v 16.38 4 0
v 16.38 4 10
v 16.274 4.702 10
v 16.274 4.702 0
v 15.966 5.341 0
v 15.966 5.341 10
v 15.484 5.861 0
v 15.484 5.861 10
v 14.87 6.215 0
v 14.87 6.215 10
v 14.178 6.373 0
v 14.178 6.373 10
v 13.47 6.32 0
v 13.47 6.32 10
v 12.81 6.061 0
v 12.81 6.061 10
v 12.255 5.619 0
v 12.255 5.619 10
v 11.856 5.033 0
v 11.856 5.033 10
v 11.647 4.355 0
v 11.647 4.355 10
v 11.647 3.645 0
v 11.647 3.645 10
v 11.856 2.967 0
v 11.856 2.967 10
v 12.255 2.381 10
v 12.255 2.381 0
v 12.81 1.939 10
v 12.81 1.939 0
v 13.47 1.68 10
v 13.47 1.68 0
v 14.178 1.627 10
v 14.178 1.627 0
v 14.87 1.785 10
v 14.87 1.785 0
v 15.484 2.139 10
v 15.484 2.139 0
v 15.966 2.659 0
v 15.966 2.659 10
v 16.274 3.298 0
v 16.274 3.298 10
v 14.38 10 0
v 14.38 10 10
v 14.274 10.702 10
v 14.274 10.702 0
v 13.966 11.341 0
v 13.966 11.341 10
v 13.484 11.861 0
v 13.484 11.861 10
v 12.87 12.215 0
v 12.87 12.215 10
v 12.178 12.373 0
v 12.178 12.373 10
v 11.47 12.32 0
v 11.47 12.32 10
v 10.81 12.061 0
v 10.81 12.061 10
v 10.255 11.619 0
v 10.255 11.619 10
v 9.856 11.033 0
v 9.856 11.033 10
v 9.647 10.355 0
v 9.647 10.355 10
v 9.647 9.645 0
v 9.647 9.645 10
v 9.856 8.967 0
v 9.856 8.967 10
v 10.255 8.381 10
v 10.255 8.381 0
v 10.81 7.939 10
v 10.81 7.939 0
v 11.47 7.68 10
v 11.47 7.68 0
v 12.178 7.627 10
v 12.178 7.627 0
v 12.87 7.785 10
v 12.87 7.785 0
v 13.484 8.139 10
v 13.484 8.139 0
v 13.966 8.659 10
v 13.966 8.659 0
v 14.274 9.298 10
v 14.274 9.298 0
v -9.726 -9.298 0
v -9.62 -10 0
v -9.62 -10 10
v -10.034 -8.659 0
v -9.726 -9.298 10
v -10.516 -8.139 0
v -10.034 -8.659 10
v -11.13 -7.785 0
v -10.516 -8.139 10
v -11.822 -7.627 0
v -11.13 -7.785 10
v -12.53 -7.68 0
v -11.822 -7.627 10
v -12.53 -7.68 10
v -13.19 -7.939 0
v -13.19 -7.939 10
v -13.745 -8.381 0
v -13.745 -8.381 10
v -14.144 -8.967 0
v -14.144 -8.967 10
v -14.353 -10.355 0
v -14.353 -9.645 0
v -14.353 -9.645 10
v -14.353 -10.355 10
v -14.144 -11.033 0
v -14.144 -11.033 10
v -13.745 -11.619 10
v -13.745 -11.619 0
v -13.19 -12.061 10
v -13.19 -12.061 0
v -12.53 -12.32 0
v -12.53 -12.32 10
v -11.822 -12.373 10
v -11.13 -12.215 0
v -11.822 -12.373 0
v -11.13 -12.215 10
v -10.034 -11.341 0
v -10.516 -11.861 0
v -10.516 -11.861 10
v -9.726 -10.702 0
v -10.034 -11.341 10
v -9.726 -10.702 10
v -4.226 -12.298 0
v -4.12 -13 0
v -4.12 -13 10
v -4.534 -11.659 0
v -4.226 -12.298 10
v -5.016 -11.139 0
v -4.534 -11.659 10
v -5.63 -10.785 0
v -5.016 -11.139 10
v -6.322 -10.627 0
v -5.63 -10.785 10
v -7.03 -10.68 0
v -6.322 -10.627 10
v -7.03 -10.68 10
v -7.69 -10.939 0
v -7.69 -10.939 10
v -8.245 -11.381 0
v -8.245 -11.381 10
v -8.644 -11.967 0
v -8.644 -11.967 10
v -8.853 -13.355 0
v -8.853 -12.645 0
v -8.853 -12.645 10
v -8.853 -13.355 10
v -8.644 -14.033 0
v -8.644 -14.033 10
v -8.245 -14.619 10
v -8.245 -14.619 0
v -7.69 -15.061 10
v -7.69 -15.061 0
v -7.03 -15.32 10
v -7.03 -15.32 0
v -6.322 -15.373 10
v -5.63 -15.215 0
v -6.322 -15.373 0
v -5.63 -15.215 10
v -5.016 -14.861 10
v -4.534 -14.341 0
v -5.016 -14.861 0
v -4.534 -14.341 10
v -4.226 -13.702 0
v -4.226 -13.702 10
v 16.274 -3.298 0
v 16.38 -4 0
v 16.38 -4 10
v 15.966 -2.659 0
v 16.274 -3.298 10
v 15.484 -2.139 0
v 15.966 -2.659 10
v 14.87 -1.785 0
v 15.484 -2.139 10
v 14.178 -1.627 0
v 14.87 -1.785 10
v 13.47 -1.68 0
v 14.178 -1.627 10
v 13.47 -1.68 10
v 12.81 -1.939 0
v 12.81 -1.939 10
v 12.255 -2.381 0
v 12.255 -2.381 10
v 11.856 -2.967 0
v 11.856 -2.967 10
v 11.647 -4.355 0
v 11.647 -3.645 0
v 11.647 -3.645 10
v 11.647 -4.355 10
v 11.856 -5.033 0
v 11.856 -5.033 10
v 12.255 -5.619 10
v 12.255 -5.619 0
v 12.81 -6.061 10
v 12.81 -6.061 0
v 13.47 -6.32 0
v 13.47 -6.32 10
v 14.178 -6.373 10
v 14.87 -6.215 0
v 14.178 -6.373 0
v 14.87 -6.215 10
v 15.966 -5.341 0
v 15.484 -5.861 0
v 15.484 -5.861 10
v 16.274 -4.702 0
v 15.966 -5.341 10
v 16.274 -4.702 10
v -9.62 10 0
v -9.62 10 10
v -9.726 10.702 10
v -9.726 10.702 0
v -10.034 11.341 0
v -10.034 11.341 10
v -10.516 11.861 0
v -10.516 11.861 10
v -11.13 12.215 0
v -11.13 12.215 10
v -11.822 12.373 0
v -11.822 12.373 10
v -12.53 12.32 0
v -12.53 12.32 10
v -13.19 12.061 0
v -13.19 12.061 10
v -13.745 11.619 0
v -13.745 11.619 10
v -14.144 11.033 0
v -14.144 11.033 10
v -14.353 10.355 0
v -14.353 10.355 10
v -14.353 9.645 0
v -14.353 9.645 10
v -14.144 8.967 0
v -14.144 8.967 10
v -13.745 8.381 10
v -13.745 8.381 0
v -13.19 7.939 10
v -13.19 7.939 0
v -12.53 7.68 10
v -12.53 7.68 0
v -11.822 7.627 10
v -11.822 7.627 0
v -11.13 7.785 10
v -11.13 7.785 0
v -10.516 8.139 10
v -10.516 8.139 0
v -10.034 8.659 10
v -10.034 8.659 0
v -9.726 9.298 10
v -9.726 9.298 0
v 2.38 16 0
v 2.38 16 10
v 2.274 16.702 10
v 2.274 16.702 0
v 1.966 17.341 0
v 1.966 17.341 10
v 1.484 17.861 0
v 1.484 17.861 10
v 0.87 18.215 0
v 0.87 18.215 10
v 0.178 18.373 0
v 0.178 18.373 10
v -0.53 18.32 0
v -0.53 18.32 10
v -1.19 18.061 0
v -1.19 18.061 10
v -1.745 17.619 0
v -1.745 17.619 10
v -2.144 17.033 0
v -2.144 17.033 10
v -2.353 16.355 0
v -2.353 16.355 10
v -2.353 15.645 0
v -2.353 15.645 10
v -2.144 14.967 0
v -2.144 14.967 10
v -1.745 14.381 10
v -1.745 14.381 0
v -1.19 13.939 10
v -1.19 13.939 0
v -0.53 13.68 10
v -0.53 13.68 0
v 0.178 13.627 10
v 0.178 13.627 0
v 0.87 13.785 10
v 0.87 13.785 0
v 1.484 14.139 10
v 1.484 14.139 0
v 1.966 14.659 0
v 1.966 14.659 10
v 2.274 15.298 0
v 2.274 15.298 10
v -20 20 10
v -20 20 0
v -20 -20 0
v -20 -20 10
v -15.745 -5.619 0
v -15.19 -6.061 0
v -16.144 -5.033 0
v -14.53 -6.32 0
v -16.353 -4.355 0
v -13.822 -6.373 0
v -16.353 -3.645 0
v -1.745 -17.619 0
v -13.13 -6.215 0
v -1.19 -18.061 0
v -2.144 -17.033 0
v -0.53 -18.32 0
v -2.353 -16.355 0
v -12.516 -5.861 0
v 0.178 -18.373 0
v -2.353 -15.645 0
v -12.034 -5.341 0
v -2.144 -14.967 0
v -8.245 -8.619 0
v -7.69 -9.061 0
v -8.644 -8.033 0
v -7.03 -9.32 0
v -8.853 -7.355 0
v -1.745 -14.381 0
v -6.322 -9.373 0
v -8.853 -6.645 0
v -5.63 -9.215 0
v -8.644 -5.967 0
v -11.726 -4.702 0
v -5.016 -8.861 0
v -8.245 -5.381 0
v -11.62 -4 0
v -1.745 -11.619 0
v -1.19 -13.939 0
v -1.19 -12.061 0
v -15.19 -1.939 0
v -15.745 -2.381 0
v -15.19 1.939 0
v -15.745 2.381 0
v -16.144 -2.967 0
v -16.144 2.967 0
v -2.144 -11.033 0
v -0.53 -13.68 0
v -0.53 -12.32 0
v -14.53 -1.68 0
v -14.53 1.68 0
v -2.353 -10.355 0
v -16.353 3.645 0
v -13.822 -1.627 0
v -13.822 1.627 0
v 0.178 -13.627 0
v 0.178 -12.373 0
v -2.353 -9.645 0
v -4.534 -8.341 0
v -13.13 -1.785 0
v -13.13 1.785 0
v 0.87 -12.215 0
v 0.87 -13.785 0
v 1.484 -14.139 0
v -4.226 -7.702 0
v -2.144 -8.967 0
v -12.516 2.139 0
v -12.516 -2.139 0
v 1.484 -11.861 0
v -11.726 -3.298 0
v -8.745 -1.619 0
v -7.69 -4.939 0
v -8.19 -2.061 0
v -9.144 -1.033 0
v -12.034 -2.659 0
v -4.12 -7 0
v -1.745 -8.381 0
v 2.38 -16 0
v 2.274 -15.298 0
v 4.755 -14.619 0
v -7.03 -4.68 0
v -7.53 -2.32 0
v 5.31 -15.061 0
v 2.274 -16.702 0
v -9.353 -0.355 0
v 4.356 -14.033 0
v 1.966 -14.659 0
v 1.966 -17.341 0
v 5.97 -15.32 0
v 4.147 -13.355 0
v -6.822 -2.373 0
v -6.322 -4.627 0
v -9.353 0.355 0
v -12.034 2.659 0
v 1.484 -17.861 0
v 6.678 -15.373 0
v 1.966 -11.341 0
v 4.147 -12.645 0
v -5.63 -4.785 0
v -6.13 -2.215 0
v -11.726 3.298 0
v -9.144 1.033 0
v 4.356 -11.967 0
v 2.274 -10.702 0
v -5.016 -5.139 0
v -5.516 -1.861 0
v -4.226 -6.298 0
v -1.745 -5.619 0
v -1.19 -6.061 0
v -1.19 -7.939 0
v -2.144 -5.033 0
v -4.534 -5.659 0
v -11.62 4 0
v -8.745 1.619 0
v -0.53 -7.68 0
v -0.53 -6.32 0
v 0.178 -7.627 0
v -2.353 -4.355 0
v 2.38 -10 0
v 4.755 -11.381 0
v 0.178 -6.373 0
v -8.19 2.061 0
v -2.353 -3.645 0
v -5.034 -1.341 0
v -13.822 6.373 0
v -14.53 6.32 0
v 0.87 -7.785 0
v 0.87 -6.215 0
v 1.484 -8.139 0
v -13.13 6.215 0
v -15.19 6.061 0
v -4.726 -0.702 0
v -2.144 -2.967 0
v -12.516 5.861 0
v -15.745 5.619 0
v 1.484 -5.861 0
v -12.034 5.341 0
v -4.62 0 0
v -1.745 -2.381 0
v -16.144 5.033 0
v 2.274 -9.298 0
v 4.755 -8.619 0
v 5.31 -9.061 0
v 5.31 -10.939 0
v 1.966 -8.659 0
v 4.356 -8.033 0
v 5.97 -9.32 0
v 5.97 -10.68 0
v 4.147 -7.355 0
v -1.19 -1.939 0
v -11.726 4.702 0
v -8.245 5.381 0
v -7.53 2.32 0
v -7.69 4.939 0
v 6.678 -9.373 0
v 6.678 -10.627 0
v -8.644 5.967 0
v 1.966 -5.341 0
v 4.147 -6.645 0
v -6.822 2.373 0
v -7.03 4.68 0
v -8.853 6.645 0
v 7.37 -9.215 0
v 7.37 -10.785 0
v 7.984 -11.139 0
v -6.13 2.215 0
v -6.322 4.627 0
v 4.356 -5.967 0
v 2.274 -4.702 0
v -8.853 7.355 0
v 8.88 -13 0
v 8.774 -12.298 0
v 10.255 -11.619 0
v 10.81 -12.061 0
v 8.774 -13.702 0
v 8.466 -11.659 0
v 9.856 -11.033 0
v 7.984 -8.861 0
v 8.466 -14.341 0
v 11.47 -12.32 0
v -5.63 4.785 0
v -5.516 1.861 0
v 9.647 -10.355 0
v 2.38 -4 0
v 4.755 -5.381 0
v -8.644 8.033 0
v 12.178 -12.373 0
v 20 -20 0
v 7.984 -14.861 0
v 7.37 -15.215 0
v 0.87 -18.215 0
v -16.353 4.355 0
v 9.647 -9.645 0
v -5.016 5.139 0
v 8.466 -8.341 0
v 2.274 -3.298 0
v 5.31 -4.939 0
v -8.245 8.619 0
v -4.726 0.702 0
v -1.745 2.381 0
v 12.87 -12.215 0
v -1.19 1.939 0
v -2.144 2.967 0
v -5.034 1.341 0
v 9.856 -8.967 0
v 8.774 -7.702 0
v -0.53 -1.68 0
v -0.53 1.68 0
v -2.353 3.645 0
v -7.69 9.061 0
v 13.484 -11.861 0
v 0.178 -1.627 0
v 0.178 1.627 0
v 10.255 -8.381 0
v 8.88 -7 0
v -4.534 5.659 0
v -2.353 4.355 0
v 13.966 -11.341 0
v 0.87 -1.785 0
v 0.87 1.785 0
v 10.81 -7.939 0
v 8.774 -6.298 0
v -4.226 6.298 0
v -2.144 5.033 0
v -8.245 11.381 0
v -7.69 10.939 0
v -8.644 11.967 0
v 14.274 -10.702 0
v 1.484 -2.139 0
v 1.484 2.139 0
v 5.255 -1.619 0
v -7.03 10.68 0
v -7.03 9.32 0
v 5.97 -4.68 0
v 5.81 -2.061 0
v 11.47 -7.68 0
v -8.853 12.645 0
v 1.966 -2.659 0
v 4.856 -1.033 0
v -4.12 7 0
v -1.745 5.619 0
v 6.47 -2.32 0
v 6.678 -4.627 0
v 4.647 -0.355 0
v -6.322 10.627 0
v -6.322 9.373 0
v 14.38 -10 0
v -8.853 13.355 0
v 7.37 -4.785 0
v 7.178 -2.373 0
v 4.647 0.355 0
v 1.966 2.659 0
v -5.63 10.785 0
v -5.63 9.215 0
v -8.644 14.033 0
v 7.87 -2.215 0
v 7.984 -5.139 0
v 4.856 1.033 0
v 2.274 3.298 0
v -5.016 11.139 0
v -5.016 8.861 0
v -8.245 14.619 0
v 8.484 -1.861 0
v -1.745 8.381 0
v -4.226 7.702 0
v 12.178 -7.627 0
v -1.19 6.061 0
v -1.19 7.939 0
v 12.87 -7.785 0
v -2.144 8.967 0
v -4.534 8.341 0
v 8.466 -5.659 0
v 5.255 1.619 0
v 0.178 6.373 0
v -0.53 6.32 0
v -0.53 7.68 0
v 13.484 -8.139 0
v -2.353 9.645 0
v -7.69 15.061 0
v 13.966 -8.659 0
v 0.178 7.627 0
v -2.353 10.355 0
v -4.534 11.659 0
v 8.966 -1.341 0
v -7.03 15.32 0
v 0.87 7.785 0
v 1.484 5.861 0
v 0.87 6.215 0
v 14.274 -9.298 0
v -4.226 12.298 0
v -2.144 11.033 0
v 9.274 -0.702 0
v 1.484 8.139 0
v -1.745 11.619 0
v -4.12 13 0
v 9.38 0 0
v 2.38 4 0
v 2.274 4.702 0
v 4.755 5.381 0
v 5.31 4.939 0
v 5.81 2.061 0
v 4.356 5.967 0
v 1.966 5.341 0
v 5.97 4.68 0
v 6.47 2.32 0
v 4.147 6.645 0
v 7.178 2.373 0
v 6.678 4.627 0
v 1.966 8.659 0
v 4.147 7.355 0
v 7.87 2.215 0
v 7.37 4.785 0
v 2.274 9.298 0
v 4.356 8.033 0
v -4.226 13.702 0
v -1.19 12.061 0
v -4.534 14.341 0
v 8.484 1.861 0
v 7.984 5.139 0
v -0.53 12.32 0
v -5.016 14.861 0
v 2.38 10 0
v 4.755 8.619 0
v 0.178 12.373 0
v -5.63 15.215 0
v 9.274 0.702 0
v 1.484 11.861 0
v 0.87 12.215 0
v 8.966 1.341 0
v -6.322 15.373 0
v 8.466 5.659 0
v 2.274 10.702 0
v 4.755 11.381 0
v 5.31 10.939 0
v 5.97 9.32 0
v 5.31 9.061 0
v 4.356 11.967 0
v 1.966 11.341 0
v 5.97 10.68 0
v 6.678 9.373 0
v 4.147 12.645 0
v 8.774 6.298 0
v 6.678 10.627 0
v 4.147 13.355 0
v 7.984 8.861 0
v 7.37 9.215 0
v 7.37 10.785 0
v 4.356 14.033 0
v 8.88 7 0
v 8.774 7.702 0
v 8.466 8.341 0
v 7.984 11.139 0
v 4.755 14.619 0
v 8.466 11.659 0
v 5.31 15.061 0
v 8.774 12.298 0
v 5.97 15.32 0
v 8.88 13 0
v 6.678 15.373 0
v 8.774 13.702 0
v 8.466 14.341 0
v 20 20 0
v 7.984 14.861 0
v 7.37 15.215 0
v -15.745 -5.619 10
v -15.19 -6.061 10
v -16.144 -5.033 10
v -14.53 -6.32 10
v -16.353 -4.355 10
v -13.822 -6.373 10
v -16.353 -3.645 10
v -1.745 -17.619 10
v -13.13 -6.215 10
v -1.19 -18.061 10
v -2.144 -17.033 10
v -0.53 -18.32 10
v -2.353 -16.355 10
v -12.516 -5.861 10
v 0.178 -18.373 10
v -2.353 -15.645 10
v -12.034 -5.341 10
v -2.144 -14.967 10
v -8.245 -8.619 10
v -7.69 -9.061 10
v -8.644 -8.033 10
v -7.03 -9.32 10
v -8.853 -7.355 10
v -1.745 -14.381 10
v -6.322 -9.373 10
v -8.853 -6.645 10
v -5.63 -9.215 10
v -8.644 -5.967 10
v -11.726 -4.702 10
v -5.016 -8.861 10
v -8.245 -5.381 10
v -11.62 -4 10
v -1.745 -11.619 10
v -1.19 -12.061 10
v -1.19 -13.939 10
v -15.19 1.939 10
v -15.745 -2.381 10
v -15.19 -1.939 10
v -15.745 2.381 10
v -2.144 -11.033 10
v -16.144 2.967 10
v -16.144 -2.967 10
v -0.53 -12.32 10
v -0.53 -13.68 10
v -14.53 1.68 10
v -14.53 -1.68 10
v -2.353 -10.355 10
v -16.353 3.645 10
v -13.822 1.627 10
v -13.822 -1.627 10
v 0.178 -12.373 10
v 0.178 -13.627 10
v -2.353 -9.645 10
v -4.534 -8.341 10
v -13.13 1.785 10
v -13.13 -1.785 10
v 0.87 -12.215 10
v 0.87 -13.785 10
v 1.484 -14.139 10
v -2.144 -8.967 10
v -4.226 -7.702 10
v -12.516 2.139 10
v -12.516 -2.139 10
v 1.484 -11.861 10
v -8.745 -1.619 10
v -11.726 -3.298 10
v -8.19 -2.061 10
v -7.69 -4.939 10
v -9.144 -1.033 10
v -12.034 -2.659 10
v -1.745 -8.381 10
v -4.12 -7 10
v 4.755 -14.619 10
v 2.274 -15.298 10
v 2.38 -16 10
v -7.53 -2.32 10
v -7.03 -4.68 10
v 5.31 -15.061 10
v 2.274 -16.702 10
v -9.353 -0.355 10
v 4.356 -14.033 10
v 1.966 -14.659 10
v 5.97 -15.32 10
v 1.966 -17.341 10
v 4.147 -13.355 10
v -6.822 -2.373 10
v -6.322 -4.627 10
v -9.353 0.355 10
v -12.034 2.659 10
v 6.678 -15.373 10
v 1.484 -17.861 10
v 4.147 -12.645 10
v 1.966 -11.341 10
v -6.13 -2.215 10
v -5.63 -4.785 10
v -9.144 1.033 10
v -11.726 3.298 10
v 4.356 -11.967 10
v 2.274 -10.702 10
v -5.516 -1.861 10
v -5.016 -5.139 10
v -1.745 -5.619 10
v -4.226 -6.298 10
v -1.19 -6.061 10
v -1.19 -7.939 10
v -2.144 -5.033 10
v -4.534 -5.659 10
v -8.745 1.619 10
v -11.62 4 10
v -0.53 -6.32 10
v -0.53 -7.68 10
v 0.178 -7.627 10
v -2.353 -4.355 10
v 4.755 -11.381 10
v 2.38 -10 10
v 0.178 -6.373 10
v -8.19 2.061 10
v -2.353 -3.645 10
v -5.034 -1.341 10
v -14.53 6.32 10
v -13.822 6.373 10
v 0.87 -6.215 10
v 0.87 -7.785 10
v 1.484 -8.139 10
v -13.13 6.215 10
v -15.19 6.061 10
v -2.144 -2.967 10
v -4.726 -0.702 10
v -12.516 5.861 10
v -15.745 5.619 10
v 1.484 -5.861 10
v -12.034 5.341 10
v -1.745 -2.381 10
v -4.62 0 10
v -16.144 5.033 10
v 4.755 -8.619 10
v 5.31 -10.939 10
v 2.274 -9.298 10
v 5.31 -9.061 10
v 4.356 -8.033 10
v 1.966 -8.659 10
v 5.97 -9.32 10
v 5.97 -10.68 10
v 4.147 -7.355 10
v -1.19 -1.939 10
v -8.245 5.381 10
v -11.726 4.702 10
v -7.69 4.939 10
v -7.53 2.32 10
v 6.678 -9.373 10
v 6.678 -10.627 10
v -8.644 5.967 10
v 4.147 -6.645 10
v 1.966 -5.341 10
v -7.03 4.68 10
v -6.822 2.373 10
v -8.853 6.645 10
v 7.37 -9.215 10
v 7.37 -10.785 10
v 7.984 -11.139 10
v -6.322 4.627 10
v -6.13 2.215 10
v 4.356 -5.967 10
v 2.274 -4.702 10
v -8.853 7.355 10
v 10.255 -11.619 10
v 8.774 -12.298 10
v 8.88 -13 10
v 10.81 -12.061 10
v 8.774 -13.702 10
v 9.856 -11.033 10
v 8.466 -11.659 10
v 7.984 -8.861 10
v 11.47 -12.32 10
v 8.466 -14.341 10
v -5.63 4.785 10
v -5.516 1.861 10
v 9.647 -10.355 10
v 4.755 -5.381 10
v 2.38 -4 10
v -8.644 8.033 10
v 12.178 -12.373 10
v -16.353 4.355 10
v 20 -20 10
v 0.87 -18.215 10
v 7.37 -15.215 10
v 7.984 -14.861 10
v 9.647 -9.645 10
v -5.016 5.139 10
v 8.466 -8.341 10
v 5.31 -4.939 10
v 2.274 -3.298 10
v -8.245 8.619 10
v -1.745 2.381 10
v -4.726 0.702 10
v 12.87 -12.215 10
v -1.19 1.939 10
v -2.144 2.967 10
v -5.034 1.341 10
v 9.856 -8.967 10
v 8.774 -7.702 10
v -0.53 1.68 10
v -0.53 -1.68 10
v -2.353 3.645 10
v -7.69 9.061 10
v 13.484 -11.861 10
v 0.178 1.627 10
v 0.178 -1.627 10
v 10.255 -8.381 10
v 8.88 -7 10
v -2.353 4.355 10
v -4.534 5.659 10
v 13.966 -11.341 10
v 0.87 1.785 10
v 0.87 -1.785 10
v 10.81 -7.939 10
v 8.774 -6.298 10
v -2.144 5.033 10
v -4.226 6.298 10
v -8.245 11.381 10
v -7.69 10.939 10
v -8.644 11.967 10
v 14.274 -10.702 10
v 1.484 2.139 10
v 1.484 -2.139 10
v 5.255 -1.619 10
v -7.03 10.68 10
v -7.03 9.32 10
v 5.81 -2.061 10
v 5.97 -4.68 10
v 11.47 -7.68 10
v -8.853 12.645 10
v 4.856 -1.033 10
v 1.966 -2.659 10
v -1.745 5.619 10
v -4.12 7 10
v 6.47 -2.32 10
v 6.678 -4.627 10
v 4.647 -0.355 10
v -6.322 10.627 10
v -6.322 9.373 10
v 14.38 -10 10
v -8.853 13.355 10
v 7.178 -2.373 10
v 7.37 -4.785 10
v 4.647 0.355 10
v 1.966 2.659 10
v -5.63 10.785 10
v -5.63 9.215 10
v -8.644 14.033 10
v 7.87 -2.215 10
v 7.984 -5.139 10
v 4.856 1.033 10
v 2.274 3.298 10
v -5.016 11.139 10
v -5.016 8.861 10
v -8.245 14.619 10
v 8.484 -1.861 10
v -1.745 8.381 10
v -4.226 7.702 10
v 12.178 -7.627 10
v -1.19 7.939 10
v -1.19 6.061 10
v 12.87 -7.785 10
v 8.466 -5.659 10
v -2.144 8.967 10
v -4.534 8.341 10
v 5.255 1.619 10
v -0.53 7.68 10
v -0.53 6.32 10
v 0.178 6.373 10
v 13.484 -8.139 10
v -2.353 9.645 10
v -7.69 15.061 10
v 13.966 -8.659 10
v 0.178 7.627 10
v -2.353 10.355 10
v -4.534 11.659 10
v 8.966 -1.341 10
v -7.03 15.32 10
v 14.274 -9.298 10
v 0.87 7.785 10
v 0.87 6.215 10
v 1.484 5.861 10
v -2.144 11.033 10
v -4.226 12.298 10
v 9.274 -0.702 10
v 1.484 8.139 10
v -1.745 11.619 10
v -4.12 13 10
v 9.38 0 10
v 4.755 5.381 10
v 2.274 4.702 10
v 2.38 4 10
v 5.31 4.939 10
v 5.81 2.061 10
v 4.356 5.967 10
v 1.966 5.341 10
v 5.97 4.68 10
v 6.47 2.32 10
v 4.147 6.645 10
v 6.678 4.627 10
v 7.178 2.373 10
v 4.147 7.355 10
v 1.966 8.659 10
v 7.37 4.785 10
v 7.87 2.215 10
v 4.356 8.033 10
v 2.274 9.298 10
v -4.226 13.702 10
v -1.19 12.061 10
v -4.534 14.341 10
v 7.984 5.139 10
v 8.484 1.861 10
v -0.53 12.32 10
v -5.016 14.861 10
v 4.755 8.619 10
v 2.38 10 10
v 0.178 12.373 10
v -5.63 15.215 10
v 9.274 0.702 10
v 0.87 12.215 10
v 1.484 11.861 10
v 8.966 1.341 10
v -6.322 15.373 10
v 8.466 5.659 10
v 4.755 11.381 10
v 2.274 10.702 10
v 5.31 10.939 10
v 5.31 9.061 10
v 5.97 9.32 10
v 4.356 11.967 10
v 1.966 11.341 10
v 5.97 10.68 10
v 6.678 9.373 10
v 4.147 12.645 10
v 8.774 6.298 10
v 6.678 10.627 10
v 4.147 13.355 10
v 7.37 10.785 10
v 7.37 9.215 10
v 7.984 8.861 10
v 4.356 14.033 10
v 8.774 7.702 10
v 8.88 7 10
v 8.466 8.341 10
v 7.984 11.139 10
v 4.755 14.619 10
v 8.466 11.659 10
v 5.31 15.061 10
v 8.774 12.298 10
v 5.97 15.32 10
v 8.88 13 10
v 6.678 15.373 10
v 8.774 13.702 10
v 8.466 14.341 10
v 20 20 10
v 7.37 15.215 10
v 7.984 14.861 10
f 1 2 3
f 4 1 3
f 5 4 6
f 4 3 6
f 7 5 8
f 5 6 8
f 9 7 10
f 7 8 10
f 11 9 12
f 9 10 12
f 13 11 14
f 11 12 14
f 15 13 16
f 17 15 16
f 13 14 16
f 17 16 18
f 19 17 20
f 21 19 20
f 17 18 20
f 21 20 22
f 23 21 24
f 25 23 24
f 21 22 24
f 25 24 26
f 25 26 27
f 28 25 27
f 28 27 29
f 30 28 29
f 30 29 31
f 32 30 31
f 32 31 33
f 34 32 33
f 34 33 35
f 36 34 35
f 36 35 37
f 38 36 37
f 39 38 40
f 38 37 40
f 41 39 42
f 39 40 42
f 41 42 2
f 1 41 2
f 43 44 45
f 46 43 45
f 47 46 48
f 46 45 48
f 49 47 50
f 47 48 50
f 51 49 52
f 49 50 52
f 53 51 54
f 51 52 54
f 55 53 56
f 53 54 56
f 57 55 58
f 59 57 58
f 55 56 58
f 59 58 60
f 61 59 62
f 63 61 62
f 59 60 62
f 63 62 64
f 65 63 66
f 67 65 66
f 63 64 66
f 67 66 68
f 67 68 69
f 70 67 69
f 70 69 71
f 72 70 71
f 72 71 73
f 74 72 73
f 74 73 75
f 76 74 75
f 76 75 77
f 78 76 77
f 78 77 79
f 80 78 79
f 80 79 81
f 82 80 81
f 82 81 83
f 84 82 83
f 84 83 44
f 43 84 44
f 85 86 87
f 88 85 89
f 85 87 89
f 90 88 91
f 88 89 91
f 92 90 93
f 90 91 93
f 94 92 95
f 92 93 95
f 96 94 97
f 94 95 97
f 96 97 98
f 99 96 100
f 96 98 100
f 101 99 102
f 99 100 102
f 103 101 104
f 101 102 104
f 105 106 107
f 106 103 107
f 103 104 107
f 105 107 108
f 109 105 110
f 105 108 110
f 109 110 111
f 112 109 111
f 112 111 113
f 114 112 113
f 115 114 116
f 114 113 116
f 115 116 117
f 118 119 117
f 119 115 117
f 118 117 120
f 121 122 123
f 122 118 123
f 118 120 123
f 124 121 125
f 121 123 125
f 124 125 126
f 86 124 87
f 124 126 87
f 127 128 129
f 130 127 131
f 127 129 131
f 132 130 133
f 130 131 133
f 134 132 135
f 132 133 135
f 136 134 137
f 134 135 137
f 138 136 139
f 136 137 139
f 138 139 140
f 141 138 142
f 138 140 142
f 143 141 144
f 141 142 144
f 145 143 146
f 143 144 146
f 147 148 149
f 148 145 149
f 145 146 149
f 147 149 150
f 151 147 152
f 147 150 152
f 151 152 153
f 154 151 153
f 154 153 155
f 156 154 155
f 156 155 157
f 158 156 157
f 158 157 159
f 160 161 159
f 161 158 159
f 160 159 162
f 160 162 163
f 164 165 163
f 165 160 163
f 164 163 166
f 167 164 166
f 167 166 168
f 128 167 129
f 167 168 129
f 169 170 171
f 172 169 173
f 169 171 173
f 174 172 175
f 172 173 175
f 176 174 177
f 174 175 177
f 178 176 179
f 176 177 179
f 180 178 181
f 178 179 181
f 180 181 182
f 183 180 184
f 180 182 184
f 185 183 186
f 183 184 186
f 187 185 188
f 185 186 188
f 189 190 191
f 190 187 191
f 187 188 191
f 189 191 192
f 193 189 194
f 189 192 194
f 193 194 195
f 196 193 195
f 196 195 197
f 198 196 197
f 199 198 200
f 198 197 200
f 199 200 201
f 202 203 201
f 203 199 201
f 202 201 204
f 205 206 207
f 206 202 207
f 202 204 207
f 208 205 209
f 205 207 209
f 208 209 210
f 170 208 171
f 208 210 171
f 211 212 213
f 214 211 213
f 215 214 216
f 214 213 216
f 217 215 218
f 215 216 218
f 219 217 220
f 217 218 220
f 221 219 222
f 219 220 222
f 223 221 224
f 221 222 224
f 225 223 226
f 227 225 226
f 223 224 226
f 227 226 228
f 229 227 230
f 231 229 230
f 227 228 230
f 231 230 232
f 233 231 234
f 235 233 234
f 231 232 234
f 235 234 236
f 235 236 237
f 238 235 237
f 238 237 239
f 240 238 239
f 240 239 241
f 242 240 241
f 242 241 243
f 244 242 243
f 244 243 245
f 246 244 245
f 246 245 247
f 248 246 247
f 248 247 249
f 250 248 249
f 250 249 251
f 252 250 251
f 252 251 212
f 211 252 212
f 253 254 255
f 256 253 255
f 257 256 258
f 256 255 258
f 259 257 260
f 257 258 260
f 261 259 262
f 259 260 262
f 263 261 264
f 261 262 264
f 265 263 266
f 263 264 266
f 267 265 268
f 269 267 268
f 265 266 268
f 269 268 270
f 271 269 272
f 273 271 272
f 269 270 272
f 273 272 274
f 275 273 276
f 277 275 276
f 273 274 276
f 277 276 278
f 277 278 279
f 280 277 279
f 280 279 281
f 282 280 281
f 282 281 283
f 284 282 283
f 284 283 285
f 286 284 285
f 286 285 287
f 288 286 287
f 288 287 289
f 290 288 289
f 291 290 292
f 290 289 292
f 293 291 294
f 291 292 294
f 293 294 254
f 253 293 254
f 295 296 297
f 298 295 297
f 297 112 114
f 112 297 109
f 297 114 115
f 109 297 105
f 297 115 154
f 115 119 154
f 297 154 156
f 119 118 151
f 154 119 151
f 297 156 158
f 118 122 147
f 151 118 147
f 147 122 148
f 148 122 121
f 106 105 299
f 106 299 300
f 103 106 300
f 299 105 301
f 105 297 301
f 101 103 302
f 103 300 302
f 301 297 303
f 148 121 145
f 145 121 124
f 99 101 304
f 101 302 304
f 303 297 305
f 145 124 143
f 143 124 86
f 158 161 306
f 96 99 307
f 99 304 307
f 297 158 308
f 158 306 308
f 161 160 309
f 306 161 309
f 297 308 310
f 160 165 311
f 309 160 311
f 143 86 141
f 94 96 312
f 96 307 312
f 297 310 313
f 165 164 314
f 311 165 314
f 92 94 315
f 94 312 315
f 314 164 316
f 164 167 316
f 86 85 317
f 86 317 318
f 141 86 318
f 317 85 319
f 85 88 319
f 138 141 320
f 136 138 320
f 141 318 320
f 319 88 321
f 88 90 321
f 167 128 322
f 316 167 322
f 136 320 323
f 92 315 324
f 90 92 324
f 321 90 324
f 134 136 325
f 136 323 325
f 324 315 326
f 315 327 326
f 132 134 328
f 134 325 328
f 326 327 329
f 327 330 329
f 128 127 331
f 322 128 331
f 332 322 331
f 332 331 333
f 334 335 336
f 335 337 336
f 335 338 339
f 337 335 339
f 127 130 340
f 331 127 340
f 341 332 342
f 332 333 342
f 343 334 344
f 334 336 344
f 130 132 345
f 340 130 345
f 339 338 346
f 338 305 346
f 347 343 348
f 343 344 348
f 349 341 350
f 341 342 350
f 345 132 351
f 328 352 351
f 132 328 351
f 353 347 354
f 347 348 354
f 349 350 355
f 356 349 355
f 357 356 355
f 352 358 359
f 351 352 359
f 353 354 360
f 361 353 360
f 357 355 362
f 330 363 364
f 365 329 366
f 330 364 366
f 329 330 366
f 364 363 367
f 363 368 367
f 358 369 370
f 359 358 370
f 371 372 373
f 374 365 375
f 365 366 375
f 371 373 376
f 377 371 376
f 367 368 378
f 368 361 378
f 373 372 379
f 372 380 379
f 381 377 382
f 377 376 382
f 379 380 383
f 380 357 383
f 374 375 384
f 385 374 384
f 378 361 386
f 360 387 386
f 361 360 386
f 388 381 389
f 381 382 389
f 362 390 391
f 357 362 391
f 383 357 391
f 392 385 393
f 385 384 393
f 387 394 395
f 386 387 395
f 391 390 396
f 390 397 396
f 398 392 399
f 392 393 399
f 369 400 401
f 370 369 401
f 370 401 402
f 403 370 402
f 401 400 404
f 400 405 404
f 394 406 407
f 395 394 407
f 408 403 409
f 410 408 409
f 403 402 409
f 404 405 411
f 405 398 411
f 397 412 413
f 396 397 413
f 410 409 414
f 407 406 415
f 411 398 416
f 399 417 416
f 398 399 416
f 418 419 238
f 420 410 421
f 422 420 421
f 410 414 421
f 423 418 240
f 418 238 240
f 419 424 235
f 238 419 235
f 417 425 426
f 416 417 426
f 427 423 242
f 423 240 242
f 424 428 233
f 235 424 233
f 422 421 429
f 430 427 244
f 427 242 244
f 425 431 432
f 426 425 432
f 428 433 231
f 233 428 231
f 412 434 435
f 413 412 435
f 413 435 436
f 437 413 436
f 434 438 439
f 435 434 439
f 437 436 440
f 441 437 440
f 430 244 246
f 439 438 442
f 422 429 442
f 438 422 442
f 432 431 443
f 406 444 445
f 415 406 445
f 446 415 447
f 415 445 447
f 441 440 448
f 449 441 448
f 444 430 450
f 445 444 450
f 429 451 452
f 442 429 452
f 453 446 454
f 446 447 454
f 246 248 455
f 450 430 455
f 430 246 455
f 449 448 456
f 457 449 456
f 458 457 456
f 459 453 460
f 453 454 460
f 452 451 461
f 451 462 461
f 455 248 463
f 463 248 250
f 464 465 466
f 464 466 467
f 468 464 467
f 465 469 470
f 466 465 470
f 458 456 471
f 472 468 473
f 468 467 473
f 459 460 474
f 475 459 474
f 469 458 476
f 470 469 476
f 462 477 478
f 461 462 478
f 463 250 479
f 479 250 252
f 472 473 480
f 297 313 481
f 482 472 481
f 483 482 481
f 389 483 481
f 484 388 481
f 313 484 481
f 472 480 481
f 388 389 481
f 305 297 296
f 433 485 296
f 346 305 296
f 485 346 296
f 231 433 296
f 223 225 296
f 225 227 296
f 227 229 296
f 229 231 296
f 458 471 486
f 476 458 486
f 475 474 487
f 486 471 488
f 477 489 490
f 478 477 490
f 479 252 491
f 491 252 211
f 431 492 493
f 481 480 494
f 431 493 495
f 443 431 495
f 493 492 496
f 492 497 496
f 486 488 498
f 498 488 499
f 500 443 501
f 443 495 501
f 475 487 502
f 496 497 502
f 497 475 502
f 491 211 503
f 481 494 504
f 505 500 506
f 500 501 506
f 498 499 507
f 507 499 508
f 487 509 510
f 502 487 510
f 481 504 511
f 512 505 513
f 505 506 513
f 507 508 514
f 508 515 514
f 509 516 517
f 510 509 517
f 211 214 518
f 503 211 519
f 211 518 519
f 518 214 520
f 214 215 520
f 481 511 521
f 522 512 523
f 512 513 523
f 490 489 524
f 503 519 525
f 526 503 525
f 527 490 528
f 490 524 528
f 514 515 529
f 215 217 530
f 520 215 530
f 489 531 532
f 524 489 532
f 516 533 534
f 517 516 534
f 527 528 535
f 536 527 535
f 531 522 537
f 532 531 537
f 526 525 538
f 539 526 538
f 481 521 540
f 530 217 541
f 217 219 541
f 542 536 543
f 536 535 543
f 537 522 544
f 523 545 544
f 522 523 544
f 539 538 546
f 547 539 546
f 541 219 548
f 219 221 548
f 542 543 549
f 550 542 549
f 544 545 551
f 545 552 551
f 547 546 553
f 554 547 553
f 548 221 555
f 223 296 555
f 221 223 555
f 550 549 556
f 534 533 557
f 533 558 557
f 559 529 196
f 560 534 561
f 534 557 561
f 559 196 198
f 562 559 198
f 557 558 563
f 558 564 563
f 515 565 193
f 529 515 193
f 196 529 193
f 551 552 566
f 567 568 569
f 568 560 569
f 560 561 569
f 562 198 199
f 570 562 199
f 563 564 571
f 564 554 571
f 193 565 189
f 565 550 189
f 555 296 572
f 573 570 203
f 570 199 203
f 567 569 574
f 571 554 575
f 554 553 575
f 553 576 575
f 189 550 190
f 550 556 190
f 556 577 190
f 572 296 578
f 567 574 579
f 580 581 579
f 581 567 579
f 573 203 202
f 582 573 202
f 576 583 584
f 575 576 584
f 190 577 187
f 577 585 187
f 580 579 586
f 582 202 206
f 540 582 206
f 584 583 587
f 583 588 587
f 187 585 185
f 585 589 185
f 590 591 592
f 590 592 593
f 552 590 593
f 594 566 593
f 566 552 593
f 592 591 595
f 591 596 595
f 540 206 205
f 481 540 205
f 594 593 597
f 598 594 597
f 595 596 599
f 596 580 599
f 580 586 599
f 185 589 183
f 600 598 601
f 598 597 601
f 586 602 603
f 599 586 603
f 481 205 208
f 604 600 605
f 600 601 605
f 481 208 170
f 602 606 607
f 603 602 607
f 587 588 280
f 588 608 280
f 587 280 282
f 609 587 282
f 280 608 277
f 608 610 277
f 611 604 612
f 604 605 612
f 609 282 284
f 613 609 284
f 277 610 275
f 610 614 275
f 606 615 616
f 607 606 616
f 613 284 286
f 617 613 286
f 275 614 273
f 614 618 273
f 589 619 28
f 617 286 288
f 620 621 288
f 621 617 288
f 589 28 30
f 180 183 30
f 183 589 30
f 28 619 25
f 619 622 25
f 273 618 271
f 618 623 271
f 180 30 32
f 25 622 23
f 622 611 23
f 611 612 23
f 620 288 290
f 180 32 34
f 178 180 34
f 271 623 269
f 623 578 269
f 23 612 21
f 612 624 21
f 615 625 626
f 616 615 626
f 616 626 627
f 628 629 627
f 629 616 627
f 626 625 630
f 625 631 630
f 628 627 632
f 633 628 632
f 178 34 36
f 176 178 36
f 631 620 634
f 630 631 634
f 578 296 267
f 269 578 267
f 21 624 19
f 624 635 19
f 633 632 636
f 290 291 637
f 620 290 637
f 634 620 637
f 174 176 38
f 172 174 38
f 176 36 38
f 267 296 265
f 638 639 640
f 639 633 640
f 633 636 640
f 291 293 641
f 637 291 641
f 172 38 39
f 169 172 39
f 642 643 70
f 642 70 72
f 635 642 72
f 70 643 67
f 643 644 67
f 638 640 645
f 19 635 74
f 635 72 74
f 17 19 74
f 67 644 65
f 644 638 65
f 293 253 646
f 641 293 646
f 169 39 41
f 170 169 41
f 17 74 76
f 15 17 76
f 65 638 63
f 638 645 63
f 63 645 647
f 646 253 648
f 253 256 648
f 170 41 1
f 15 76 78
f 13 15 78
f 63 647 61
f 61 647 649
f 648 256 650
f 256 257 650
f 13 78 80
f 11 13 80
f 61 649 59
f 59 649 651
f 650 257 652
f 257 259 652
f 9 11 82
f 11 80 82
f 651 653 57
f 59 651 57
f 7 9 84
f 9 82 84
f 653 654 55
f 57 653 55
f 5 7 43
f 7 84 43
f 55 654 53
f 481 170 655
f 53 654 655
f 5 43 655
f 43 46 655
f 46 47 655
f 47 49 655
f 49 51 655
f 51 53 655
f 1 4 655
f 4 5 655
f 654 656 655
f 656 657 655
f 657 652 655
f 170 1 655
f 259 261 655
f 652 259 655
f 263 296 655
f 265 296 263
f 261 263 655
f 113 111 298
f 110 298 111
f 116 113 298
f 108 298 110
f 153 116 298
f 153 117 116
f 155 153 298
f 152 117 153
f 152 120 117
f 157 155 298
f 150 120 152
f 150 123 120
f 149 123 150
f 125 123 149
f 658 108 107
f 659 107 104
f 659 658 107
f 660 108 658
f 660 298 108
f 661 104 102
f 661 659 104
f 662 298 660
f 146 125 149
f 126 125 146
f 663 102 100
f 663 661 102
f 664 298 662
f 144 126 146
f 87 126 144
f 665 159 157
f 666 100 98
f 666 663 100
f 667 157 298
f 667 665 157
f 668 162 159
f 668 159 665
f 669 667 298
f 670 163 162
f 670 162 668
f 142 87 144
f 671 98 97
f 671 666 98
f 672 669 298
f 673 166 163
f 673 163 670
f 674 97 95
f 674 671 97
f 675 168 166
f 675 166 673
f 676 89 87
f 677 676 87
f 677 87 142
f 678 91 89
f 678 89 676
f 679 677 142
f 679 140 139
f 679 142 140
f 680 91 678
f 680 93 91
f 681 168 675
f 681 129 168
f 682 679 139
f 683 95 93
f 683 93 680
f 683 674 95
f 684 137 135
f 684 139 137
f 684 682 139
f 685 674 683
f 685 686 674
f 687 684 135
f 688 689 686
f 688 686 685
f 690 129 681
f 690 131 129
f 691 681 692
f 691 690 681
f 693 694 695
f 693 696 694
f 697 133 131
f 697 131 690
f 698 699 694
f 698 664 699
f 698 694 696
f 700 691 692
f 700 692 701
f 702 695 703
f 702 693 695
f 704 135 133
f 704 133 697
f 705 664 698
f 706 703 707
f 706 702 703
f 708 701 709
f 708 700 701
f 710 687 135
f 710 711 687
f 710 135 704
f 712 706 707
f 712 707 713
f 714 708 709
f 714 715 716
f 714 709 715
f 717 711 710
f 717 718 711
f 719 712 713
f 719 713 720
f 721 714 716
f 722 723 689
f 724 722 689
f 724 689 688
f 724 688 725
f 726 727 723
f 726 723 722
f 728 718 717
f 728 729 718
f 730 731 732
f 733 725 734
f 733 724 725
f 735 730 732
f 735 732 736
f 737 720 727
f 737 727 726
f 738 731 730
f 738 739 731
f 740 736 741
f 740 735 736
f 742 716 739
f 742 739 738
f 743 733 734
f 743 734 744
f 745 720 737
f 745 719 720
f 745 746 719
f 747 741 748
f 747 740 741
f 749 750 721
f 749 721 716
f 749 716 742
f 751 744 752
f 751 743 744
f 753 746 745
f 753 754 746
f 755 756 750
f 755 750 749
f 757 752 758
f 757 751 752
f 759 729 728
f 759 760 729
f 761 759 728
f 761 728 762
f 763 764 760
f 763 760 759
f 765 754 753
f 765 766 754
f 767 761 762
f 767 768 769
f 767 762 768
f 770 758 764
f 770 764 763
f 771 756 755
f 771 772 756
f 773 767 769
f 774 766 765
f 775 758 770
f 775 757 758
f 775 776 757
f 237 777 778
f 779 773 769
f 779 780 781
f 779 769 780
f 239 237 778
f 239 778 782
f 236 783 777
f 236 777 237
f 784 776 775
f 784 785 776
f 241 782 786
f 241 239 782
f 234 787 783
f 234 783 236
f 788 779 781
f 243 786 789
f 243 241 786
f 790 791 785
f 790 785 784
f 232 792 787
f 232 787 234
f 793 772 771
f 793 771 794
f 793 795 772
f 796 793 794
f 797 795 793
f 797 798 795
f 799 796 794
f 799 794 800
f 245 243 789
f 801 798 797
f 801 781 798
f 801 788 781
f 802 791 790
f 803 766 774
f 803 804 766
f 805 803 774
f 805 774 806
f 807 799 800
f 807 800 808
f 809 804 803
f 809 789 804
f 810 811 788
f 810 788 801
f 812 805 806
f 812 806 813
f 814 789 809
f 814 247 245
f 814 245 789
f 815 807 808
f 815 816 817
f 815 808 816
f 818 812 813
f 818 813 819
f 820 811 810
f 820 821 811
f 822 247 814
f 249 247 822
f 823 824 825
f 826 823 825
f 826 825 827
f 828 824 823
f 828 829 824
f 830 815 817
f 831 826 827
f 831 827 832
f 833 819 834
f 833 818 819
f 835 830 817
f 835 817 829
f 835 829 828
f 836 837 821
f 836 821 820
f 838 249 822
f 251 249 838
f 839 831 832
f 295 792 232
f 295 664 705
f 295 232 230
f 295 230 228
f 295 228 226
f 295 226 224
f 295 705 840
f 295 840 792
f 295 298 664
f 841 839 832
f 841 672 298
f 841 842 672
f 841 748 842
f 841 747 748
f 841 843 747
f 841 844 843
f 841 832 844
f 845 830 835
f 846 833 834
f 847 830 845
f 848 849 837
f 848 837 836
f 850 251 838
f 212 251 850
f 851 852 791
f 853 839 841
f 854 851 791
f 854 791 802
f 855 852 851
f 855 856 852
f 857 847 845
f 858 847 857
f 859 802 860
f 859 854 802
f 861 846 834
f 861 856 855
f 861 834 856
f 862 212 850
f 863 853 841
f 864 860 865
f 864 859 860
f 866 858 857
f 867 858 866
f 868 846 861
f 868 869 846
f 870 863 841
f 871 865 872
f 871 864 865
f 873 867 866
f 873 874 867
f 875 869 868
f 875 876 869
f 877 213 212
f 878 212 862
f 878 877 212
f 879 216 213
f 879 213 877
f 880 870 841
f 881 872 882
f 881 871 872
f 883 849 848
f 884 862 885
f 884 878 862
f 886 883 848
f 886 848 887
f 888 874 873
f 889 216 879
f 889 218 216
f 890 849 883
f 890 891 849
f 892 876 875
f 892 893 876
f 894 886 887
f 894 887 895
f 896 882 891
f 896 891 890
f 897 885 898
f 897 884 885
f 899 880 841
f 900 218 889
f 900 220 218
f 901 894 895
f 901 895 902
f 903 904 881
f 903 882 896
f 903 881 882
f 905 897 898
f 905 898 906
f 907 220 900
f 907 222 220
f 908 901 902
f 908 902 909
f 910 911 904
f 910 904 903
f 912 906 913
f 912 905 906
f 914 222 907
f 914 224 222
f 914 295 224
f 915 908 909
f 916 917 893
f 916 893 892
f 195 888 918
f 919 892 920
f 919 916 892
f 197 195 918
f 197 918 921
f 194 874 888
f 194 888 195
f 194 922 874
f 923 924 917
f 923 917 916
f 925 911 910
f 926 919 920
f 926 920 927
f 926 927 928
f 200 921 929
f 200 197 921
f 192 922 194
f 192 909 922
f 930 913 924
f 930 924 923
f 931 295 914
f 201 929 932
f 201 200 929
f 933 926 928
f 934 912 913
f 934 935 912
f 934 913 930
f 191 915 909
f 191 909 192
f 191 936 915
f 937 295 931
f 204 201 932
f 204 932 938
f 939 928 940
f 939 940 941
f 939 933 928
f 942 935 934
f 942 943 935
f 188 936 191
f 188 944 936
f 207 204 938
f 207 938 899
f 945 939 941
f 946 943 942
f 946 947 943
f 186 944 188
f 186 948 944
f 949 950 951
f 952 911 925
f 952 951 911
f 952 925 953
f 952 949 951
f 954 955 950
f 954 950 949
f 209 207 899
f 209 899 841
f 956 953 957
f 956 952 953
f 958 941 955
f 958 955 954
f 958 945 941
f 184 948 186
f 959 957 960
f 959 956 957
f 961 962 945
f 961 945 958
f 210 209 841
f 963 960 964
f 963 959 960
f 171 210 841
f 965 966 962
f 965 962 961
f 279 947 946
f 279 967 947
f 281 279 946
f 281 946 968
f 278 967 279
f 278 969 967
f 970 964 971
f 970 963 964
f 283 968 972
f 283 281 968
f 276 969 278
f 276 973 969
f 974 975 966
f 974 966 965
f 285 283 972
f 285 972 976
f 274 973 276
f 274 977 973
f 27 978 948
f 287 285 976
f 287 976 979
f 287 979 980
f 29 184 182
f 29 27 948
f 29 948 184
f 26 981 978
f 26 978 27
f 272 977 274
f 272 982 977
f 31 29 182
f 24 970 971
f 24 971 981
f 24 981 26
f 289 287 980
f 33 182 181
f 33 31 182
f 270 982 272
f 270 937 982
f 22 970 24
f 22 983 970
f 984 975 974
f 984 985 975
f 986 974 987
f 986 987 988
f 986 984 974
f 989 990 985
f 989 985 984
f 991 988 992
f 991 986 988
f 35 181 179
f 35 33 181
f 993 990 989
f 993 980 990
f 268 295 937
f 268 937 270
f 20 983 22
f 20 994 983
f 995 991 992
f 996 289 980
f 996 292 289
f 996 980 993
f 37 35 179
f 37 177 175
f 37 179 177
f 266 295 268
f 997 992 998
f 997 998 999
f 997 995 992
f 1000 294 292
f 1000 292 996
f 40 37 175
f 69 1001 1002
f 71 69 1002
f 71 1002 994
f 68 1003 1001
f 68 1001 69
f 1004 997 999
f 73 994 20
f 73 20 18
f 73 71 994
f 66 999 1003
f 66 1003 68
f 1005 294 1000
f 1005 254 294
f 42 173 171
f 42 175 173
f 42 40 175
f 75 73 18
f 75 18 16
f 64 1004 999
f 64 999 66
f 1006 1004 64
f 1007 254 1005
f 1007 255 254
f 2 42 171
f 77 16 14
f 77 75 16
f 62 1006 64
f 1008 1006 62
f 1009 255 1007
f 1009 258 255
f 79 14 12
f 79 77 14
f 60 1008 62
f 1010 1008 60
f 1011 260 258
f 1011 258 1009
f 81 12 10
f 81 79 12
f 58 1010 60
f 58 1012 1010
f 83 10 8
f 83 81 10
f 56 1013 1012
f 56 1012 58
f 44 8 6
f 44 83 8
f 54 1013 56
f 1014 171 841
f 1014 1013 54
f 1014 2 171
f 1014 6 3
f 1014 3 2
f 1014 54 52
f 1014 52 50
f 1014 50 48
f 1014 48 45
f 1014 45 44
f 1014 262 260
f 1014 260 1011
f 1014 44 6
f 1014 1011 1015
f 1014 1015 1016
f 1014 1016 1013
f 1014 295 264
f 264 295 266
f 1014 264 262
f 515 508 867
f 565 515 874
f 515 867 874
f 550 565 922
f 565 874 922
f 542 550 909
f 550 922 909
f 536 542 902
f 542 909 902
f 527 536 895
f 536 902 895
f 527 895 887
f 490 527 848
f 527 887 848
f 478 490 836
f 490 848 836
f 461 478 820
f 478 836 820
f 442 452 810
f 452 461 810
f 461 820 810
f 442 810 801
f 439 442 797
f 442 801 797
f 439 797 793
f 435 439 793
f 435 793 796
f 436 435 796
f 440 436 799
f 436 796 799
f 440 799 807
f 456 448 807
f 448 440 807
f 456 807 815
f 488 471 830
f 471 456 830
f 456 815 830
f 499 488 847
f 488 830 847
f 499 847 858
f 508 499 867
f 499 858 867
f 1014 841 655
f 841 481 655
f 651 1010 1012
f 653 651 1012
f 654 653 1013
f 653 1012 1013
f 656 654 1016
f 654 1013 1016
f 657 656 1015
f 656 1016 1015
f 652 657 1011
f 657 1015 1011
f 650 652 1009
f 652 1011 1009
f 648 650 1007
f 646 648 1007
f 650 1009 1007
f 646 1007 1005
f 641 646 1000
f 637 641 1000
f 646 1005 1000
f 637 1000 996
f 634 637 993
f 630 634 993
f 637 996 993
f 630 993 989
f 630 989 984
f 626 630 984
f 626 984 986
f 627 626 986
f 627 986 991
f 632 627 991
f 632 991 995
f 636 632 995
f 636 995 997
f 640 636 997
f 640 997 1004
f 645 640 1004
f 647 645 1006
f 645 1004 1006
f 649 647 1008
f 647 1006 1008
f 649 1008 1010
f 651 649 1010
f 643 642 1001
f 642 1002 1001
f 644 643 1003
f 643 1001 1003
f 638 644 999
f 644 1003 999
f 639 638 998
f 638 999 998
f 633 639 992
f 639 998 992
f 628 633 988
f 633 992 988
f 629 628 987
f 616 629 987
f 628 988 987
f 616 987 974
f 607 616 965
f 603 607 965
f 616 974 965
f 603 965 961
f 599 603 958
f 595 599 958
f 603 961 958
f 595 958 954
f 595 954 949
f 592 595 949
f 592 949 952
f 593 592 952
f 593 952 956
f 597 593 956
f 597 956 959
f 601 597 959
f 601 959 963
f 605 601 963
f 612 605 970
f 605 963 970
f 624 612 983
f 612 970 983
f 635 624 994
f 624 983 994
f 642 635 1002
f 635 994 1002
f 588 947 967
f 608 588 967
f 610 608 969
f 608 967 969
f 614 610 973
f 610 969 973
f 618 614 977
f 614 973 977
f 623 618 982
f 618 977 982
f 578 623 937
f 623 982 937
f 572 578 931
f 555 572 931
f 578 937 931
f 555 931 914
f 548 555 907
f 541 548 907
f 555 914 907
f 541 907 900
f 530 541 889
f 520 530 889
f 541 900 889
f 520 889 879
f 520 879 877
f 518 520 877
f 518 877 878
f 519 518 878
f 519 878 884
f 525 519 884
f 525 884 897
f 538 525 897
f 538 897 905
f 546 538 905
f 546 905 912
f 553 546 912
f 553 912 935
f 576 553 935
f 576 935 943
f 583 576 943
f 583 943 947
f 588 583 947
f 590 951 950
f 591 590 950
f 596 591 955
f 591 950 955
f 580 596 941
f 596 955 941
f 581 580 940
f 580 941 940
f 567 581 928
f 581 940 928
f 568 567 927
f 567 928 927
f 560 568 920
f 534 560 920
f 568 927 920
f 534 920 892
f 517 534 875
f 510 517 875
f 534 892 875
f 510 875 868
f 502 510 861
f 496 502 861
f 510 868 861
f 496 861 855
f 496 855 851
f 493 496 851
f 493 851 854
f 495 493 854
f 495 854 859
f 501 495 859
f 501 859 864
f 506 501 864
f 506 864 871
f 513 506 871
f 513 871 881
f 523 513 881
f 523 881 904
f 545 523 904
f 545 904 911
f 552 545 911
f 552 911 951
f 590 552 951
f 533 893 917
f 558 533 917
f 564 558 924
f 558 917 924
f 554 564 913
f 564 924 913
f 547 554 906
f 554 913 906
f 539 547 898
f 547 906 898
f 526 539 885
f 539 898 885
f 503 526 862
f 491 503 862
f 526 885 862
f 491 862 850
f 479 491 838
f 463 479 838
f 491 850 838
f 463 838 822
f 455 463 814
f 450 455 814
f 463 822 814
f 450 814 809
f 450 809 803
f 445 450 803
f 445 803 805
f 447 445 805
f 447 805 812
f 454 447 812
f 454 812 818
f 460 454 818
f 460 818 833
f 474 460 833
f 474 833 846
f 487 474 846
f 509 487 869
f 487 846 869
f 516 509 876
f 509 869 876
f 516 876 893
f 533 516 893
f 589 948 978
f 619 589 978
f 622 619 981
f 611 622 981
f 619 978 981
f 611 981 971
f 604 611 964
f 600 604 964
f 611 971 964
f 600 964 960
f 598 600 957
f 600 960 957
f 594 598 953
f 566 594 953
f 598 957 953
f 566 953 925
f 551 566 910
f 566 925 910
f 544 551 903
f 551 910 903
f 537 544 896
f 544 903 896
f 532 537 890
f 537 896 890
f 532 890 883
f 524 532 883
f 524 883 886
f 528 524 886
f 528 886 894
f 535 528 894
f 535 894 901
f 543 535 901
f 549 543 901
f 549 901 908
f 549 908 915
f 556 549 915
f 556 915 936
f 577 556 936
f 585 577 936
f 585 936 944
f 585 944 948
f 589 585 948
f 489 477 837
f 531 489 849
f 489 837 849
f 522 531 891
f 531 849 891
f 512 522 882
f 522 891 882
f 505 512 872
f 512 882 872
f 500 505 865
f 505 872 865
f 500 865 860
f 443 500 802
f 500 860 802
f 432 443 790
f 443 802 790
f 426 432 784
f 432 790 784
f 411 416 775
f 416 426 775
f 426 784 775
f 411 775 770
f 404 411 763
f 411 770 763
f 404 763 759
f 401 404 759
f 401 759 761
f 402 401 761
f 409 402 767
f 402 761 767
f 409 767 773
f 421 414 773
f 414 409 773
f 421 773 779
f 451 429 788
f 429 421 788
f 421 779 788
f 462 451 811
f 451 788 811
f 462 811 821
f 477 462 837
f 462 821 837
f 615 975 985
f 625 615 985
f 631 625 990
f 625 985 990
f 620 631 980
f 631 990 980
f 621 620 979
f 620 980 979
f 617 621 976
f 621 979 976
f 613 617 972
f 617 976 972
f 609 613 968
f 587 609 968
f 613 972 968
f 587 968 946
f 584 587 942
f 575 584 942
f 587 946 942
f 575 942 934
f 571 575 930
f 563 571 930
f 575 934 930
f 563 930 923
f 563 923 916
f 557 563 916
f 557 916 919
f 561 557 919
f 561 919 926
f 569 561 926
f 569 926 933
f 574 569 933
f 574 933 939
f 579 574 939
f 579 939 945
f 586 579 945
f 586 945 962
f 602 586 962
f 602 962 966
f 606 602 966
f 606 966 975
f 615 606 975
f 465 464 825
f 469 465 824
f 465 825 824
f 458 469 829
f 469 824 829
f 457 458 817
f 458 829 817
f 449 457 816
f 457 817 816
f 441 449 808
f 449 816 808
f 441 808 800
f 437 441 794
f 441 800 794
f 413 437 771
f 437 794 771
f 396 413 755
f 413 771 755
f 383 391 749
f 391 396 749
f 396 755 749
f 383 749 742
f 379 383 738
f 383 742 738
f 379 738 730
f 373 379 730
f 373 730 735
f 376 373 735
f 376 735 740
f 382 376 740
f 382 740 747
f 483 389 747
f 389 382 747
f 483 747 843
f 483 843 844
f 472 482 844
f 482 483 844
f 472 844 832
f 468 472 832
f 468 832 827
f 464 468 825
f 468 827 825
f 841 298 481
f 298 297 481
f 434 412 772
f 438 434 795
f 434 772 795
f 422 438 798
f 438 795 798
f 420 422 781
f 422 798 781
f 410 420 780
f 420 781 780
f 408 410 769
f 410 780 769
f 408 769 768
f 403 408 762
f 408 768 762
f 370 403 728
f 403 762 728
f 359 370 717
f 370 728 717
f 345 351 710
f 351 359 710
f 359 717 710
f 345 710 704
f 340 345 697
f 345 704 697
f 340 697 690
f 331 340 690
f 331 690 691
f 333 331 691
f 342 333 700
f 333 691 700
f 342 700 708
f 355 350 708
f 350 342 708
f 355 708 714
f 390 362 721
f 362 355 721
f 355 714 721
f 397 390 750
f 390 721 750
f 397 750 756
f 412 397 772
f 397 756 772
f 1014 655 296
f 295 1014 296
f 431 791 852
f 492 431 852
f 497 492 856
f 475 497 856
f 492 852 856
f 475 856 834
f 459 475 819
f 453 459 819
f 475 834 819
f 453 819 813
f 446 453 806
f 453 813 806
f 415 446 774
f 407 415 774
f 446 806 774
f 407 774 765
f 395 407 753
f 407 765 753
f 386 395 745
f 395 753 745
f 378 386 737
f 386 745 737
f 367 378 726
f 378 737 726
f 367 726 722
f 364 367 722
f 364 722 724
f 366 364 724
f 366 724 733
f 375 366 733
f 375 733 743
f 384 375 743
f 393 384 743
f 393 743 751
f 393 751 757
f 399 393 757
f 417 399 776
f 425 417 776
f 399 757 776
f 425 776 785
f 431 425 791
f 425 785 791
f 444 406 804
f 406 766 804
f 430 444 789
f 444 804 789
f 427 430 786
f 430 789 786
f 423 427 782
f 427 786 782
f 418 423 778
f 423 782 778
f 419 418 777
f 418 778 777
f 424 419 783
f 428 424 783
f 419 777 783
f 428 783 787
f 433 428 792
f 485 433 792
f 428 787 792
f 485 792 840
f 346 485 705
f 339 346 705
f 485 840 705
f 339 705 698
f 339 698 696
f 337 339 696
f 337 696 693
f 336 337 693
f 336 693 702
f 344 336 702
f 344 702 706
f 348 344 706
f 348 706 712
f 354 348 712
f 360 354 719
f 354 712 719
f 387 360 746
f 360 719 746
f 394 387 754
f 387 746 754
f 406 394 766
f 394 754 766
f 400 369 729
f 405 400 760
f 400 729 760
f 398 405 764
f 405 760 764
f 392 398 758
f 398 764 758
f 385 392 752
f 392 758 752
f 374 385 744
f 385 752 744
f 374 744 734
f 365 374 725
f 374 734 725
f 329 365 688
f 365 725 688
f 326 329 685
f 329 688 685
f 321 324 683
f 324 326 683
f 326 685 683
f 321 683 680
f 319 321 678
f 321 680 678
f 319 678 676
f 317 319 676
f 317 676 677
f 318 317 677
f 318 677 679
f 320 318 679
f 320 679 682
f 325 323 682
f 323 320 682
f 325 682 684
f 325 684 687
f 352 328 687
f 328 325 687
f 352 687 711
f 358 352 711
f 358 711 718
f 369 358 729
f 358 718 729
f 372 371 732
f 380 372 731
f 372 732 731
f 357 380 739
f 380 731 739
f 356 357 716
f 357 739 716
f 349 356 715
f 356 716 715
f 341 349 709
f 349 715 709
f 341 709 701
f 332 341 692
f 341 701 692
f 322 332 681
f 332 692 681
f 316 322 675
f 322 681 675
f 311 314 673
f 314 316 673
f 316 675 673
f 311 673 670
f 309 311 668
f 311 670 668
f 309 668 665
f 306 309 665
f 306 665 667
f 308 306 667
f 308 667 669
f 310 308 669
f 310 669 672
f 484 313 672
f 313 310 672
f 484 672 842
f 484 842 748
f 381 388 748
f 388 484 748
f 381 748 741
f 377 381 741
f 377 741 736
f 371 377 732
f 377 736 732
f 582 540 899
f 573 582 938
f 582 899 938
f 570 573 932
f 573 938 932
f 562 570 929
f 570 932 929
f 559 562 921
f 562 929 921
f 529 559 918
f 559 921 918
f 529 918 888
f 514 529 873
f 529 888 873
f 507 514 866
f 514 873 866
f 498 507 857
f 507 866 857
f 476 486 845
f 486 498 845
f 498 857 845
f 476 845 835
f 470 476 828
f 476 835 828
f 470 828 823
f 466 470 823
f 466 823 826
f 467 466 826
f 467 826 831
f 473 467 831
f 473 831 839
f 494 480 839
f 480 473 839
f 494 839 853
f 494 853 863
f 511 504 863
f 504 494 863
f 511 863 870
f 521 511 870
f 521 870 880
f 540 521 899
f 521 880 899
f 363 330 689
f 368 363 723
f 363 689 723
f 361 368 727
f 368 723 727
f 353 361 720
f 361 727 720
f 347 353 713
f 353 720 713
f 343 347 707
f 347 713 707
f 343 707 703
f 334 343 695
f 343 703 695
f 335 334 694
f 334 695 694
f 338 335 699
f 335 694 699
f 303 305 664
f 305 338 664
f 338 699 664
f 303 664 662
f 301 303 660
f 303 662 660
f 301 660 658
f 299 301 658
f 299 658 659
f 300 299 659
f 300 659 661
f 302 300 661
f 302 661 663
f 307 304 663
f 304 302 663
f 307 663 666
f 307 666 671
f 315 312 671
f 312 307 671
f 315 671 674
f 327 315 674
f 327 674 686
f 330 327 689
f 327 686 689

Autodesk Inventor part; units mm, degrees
ref_plane "YZ Plane" through (0, 0, 0) normal (1, 0, 0) x (0, 1, 0)
ref_plane "XZ Plane" through (0, 0, 0) normal (0, 1, 0) x (-1, 0, 0)
sketch "Sketch1" plane through (0, 0, 0) normal (0, 0, 1) x (1, 0, 0)
  line L0 (-20, -20) -> (20, -20)
  line L1 (20, -20) -> (20, 20)
  line L2 (20, 20) -> (-20, 20)
  line L3 (-20, 20) -> (-20, -20)
  line L4 (-20, -20) -> (20, 20) construction
  line L5 (20, -20) -> (-20, 20) construction
  point P0 (0, 0)
  dimension "d0" = 40
  dimension "d1" = 40
extrude "Extrusion1" add sketch "Sketch1" along normal blind 10
sketch "Sketch2" plane through (0, 0, 10) normal (0, 0, 1) x (1, 0, 0)
  circle A0 centre (0, 0) radius 19
  line L0 (-10.247, 16) -> (10.247, 16)
  line L1 (-13.8564, 13) -> (13.8564, 13)
  line L2 (-16.1555, 10) -> (16.1555, 10)
  line L3 (-17.6635, 7) -> (17.6635, 7)
  line L4 (-18.5742, 4) -> (18.5742, 4)
  circle A1 centre (0, 16) radius 2.38
  circle A2 centre (-6.5, 13) radius 2.38
  circle A3 centre (6.5, 13) radius 2.38
  circle A4 centre (-12, 10) radius 2.38
  circle A5 centre (0, 10) radius 2.38
  circle A6 centre (12, 10) radius 2.38
  circle A7 centre (-6.5, 7) radius 2.38
  circle A8 centre (6.5, 7) radius 2.38
  circle A9 centre (-14, 4) radius 2.38
  circle A10 centre (0, 4) radius 2.38
  circle A11 centre (14, 4) radius 2.38
  circle A12 centre (-7, 0) radius 2.38
  circle A13 centre (7, 0) radius 2.38
  dimension "d4" = 38
  dimension "d5" = 4.76
  dimension "d6" = 4.76
  dimension "d7" = 4.76
  dimension "d8" = 3
  dimension "d9" = 3
  dimension "d10" = 16
  dimension "d11" = 6.5
  dimension "d12" = 6.5
  dimension "d13" = 12
  dimension "d14" = 12
  dimension "d15" = 3
  dimension "d16" = 3
  dimension "d17" = 14
  dimension "d18" = 14
  dimension "d19" = 7
  dimension "d20" = 7
extrude "Extrusion2" cut sketch "Sketch2" against normal up to next contours A11 L4 | L4 A11 | A9 L4 | L4 A9 | A8 L3 | L3 A8 | A7 L3 | L3 A7 | A6 L2 | L2 A6 | A10 L4 | L4 A10 | A4 L2 | L2 A4 | A3 L1 | L1 A3 | A2 L1 | L1 A2 | A1 L0 | L0 A1 | A5 L2 | L2 A5 | A12 | A13
ref_plane "Work Plane1" through (-20, 0, 0) normal (0, 1, 0) x (1, 0, 0)
mirror "Mirror1" about plane through (-20, 0, 0) normal (0, 1, 0) of "Extrusion2"
properties part number "FanTemplate40mm"
